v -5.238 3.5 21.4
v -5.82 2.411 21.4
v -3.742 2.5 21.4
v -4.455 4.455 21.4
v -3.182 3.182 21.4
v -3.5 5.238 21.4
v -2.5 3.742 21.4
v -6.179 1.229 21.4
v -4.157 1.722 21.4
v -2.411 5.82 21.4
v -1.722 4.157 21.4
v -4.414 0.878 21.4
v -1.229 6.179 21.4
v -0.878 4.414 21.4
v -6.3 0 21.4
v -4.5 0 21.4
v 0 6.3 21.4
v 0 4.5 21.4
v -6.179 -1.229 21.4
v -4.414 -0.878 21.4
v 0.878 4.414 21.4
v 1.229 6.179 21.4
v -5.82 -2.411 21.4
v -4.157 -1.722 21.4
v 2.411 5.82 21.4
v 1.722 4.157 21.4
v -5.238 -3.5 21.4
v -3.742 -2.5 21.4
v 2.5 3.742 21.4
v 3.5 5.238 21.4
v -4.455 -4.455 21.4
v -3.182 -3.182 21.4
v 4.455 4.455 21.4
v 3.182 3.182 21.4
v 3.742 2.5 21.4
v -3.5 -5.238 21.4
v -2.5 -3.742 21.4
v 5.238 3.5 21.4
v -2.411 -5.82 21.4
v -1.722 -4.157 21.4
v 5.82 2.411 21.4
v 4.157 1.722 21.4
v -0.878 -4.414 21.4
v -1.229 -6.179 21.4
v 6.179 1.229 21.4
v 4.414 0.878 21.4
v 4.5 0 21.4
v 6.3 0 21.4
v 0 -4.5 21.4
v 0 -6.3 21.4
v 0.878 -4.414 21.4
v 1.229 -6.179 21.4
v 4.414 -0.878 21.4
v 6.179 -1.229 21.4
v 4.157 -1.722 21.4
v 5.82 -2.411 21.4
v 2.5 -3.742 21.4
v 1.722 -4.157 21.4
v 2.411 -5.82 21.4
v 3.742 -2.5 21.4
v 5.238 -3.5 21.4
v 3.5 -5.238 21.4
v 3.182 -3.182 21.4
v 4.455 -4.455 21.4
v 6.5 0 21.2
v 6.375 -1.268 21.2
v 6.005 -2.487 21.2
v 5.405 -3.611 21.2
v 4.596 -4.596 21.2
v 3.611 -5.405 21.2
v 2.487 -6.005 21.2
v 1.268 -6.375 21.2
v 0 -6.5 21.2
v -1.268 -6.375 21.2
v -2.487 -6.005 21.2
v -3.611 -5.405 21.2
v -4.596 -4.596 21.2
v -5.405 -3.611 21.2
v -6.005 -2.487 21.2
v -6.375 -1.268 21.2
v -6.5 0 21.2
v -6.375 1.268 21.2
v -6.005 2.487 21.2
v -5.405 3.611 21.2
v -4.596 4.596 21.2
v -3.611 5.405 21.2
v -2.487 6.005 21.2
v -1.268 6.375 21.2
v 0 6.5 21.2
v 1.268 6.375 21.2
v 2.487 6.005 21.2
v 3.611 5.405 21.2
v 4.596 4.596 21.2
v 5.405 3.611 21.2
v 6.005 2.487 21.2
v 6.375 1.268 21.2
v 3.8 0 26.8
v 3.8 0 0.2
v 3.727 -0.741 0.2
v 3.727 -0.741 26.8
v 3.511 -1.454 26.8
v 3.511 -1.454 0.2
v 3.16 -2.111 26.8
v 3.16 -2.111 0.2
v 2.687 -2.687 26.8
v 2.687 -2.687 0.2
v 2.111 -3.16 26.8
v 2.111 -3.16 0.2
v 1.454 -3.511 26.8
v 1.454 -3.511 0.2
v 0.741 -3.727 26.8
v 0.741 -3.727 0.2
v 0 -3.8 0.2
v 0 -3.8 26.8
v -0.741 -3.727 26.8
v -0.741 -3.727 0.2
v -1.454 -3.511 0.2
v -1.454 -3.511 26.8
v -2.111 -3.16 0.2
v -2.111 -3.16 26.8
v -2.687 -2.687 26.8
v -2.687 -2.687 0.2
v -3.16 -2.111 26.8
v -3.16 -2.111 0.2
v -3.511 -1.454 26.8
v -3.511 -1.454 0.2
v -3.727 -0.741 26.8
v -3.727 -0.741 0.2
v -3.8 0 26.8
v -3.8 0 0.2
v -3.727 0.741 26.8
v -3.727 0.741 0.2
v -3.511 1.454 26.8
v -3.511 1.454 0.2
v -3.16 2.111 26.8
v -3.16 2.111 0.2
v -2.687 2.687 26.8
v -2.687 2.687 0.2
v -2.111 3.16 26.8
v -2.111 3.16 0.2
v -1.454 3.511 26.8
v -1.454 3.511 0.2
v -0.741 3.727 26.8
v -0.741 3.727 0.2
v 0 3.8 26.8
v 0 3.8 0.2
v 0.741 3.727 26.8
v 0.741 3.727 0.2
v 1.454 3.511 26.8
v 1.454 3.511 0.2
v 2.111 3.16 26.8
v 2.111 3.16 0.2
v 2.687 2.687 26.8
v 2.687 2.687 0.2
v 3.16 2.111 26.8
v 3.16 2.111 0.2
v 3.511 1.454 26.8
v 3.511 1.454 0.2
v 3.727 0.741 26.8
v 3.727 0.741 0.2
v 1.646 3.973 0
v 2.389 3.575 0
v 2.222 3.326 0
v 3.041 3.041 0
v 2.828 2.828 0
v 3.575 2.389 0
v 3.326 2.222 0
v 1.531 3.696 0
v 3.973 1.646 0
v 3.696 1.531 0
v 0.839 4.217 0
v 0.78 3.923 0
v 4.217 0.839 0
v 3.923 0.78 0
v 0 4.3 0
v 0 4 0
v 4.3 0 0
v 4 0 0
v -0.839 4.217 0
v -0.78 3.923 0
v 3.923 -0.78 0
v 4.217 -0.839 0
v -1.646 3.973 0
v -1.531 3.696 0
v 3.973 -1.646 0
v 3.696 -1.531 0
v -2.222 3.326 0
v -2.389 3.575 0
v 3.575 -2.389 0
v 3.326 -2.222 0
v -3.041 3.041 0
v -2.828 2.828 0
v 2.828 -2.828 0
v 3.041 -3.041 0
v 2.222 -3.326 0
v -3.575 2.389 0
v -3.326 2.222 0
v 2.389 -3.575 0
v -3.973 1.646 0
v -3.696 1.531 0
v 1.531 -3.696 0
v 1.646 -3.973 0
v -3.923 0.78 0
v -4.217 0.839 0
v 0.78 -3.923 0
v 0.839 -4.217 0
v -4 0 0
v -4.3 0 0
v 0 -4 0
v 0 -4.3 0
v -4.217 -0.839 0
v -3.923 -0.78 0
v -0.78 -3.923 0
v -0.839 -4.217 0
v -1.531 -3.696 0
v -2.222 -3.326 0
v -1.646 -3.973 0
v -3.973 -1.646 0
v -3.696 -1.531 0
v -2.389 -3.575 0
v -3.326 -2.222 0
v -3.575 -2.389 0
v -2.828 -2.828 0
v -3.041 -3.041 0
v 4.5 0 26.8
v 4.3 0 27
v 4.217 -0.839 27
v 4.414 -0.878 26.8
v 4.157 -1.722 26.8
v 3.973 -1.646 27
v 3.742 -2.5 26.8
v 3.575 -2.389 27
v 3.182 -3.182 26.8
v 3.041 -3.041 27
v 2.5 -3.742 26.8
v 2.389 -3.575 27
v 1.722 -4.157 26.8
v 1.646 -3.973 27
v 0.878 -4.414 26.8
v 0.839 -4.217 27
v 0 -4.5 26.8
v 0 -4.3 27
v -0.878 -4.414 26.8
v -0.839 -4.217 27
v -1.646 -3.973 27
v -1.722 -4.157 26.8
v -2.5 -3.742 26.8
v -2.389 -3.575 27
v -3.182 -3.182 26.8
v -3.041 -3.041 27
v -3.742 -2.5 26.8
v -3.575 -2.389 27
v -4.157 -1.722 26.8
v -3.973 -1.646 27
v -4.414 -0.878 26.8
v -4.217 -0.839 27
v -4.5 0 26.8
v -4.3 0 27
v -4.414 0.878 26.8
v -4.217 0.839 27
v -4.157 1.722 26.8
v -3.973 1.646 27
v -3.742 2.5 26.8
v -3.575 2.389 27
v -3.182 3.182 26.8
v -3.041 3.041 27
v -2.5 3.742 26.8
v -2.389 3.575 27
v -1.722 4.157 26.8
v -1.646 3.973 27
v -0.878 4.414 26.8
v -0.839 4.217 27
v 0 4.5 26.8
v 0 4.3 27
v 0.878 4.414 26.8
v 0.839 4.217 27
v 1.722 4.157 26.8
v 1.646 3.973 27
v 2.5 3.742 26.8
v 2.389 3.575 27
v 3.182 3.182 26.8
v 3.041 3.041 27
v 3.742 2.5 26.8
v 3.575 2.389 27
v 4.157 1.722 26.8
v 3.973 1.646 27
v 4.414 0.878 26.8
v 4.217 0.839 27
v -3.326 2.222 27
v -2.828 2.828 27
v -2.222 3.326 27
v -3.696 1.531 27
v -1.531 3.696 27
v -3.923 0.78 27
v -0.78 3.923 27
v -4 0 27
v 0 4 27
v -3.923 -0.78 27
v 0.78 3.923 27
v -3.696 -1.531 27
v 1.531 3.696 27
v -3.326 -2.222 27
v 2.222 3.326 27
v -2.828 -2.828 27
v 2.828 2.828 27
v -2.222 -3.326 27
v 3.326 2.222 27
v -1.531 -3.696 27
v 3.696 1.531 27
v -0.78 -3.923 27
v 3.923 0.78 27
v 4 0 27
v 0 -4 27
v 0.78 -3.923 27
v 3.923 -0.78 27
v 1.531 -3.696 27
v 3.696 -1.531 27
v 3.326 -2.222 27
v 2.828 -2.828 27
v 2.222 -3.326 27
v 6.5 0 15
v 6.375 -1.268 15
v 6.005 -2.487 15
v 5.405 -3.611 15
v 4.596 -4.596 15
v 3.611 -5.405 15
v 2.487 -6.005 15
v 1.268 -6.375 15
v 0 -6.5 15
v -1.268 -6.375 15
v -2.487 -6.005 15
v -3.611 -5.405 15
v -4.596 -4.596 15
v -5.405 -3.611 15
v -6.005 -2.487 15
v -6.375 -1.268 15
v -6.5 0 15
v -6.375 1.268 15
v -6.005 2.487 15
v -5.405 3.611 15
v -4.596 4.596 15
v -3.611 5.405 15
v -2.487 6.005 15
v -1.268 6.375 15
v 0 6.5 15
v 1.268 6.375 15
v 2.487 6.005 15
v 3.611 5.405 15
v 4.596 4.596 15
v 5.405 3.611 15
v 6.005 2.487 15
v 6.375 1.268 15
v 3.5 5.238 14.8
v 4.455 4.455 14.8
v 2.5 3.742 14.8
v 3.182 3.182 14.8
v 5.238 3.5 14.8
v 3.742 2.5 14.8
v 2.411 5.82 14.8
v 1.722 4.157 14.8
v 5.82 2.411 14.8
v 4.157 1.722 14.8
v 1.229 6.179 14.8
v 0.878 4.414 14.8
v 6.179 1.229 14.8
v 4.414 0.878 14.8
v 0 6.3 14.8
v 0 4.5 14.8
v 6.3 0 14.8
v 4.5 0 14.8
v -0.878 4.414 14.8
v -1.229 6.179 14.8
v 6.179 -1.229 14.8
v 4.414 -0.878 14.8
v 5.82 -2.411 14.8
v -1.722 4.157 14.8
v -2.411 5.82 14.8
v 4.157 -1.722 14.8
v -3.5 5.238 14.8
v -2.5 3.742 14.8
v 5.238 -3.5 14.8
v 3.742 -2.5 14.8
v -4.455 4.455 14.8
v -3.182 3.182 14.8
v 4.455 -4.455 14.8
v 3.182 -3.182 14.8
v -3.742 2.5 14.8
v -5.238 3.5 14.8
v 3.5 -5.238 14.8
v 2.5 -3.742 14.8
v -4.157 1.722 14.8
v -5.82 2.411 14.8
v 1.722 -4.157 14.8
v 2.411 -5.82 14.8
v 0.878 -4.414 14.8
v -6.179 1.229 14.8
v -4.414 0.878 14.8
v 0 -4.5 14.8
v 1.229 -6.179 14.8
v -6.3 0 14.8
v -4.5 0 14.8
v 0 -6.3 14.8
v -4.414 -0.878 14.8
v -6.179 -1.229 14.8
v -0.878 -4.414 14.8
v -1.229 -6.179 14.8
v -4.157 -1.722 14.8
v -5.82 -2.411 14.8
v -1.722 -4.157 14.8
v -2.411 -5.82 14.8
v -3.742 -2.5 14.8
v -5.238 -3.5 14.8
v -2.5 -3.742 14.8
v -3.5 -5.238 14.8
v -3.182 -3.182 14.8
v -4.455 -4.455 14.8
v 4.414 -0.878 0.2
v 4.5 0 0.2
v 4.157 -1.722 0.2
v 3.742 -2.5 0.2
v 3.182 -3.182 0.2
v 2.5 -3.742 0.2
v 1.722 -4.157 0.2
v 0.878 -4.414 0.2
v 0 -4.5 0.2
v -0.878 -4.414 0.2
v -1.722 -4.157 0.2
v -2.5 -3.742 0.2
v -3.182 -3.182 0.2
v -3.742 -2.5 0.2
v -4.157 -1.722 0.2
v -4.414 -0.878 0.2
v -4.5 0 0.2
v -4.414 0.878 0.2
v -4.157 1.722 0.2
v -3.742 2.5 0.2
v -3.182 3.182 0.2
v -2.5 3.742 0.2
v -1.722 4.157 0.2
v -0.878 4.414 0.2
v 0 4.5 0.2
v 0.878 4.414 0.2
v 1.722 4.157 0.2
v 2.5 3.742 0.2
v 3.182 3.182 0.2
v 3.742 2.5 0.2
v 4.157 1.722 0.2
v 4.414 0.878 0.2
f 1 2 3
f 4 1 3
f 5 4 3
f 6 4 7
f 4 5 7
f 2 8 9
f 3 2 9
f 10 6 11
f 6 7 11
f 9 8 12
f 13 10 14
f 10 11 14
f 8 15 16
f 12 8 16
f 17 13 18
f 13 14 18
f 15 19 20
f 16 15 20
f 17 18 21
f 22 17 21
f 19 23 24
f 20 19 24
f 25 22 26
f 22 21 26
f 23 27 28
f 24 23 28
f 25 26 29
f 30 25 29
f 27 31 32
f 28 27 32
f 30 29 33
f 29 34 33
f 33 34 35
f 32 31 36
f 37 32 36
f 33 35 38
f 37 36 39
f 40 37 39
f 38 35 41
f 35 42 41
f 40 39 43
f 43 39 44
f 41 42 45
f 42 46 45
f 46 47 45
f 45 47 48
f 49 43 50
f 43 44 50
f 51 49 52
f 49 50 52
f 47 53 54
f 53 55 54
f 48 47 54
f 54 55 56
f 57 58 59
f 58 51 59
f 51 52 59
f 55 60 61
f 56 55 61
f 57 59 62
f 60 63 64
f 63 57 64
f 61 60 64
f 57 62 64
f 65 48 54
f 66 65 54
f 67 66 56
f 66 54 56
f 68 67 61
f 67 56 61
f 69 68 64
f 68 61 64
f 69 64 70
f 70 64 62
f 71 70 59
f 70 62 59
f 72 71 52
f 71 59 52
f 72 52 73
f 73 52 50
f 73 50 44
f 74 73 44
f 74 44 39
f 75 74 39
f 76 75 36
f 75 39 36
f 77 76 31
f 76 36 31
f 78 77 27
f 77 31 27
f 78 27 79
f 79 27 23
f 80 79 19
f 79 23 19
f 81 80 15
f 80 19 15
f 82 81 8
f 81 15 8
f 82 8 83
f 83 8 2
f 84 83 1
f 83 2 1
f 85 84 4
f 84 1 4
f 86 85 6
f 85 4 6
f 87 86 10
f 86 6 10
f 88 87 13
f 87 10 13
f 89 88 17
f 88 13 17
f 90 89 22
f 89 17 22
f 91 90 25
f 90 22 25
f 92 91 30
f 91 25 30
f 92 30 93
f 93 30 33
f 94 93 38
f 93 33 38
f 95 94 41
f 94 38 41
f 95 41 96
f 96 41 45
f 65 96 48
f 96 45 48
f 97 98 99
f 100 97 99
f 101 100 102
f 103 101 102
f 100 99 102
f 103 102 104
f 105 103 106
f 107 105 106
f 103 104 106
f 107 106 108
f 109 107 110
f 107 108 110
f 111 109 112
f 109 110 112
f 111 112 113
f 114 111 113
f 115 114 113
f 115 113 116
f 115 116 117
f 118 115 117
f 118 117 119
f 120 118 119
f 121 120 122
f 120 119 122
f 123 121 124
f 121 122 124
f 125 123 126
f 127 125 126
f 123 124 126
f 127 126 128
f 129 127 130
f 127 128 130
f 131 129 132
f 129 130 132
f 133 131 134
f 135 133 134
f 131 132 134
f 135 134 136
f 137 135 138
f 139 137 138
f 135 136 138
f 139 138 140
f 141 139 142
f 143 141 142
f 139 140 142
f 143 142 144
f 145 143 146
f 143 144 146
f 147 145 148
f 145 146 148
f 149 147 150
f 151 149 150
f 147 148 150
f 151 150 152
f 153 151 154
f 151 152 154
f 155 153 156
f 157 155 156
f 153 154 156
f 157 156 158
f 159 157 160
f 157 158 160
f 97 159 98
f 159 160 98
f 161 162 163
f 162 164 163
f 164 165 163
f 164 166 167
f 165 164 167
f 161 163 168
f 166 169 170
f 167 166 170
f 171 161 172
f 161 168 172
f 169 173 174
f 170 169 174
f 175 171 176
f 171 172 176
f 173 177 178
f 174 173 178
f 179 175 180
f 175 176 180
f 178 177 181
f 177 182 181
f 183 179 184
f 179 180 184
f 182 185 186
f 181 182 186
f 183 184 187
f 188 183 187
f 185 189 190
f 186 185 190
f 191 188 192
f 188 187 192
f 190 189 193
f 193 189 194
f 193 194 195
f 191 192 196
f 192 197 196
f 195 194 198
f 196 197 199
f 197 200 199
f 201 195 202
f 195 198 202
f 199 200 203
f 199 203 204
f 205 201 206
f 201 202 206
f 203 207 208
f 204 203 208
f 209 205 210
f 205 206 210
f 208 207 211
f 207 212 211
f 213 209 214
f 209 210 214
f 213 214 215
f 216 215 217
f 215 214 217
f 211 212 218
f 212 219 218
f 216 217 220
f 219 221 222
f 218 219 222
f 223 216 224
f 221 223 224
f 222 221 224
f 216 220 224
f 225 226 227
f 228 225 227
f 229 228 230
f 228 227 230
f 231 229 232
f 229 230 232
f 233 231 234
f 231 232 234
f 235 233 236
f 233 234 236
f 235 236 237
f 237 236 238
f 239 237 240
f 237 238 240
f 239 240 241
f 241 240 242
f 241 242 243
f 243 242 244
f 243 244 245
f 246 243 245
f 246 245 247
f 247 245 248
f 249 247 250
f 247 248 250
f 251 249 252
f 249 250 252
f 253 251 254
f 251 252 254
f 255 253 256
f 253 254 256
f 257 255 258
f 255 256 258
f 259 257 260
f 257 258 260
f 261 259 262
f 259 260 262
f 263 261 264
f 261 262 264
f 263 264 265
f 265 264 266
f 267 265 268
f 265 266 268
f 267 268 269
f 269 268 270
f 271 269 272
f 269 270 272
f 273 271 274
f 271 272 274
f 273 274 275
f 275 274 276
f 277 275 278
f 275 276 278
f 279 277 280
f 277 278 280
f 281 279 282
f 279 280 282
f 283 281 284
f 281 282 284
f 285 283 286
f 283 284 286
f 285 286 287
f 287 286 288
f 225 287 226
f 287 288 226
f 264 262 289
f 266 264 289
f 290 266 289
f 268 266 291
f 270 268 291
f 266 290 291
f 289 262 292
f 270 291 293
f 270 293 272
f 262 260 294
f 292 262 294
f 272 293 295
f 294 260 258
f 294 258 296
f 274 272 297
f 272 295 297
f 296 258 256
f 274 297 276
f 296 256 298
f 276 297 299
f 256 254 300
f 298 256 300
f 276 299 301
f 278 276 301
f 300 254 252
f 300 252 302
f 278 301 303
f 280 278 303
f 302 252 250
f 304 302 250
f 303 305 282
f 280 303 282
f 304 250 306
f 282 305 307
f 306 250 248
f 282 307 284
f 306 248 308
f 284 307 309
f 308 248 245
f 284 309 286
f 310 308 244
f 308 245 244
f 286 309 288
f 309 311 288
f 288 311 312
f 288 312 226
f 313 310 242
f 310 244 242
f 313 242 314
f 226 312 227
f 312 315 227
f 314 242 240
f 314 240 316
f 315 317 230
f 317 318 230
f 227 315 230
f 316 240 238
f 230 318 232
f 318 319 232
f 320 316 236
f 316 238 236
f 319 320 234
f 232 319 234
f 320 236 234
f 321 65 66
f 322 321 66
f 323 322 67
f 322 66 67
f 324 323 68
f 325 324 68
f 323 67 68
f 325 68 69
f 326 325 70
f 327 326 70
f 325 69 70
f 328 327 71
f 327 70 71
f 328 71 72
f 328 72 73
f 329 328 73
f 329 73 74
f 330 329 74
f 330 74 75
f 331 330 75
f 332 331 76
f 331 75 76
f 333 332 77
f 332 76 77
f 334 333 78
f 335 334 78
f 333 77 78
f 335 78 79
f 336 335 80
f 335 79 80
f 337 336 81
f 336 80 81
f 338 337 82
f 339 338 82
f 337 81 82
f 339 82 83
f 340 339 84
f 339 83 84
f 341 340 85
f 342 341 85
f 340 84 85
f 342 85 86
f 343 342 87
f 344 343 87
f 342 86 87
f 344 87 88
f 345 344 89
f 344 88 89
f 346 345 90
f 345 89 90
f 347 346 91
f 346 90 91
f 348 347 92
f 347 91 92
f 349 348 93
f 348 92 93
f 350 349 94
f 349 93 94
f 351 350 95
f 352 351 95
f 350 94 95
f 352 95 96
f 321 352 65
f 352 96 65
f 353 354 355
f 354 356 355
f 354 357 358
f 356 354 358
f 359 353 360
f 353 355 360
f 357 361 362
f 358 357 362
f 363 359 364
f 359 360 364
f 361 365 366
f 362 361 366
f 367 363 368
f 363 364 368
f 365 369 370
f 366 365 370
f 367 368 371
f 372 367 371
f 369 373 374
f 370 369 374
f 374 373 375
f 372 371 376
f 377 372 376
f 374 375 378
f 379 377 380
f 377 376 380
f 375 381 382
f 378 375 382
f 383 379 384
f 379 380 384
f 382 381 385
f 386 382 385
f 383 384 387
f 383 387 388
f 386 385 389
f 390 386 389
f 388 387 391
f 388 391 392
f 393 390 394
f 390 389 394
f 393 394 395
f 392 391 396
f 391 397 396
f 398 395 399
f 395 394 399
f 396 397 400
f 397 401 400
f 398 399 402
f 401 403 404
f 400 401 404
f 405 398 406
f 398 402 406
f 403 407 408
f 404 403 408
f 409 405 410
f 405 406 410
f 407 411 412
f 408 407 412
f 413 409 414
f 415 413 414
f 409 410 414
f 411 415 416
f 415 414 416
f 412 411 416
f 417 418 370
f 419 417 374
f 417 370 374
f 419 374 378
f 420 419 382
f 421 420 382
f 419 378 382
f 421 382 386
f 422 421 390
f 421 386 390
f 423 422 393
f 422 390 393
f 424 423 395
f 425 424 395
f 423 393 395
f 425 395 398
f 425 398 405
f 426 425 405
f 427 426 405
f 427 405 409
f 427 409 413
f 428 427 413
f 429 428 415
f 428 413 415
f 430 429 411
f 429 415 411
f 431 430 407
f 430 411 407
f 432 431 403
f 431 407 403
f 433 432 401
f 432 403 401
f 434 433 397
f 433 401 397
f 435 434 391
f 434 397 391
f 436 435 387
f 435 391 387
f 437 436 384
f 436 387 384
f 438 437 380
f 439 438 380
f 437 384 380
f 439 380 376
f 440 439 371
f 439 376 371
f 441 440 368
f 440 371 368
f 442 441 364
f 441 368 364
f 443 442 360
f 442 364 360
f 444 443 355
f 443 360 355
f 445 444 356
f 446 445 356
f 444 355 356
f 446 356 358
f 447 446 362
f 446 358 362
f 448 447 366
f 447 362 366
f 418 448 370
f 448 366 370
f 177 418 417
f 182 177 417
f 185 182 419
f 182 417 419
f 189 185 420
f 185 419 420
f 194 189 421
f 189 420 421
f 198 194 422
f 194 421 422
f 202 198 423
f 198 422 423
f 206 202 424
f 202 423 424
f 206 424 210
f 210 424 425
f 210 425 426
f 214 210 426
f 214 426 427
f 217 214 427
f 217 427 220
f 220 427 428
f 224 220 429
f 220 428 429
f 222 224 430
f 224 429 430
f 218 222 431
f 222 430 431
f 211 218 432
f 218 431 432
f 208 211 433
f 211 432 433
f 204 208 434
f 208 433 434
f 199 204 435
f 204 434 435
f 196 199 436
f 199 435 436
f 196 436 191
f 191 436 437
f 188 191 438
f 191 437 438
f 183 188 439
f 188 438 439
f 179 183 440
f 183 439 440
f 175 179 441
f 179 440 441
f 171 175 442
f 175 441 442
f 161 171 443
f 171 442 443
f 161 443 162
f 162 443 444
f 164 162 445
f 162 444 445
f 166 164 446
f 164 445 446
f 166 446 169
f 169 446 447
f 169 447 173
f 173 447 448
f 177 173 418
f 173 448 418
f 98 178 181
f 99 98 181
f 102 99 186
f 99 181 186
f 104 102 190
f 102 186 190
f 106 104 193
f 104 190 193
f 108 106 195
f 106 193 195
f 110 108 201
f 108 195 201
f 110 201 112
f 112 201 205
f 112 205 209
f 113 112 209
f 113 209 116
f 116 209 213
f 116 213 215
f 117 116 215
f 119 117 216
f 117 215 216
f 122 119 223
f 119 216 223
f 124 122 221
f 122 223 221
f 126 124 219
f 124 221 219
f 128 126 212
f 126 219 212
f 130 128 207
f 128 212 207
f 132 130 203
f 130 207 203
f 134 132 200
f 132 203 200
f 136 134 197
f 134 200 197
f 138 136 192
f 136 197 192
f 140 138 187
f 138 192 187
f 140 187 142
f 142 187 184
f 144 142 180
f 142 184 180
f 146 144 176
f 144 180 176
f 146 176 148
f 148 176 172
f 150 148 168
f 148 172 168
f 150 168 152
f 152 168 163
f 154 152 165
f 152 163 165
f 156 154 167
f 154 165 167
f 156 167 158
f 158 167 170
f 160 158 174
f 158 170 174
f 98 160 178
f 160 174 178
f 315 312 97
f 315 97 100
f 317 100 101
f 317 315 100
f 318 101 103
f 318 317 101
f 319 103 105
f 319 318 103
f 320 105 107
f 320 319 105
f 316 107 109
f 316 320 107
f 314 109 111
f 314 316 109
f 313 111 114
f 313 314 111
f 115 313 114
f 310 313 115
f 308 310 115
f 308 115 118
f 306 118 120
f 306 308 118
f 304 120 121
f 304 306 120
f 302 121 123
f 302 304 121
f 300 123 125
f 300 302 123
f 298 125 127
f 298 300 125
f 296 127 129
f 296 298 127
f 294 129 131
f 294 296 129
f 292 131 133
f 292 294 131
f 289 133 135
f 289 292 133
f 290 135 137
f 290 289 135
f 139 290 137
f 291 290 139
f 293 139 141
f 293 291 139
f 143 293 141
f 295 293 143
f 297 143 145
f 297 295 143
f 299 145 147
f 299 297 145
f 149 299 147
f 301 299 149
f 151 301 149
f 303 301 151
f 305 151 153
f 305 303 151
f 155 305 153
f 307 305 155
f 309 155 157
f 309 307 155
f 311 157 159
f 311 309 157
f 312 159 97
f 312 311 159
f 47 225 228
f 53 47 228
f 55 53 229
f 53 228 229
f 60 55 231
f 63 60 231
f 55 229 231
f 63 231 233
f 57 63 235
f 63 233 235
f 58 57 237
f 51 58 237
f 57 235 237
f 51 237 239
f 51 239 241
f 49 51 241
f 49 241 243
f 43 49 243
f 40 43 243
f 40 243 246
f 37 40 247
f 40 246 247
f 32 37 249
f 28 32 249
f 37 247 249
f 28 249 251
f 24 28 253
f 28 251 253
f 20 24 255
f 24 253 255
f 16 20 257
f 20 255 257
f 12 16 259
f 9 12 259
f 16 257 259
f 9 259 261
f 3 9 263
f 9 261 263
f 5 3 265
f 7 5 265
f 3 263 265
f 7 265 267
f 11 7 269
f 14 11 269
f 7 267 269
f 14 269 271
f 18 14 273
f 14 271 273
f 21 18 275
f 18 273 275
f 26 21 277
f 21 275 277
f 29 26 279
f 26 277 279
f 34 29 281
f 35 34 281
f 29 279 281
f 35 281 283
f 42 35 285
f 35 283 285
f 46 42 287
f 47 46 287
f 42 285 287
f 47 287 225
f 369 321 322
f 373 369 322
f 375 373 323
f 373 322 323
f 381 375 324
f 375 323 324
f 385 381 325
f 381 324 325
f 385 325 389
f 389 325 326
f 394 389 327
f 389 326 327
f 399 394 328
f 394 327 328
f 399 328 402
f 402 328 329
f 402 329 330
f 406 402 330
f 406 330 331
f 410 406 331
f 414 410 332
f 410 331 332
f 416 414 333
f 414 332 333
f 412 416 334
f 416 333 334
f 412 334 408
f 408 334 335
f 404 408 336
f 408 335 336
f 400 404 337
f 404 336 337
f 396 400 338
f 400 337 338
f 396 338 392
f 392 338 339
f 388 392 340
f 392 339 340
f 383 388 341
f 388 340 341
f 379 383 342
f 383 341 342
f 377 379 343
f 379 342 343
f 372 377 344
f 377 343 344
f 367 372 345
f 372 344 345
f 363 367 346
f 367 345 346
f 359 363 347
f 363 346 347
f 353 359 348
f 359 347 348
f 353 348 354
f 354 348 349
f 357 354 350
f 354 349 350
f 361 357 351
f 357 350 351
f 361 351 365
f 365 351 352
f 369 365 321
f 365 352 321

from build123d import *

# Parameters (mm, degrees)
F2_SIZE = 0.2


with BuildPart() as f1:
    # F0 (on Front) → F1 (revolve)
    with BuildSketch(Plane.XZ):
        Polygon((3.8, 27), (3.8, 0), (4.5, 0), (4.5, 14.8), (6.5, 14.8), (6.5, 21.4), (4.5, 21.4), (4.5, 27), align=None)
    revolve(axis=Axis((0, 0, 50), (0, 0, -1)))

    # F2
    f2_edges = [f1.edges().sort_by_distance(p)[0] for p in [
        (-4.5, 0, 0),
        (-6.5, 0, 14.8),
        (-6.5, 0, 21.4),
        (-4.5, 0, 27),
        (-3.8, 0, 27),
        (-3.8, 0, 0),
    ]]
    chamfer(f2_edges, length=F2_SIZE)


solid = f1.part
